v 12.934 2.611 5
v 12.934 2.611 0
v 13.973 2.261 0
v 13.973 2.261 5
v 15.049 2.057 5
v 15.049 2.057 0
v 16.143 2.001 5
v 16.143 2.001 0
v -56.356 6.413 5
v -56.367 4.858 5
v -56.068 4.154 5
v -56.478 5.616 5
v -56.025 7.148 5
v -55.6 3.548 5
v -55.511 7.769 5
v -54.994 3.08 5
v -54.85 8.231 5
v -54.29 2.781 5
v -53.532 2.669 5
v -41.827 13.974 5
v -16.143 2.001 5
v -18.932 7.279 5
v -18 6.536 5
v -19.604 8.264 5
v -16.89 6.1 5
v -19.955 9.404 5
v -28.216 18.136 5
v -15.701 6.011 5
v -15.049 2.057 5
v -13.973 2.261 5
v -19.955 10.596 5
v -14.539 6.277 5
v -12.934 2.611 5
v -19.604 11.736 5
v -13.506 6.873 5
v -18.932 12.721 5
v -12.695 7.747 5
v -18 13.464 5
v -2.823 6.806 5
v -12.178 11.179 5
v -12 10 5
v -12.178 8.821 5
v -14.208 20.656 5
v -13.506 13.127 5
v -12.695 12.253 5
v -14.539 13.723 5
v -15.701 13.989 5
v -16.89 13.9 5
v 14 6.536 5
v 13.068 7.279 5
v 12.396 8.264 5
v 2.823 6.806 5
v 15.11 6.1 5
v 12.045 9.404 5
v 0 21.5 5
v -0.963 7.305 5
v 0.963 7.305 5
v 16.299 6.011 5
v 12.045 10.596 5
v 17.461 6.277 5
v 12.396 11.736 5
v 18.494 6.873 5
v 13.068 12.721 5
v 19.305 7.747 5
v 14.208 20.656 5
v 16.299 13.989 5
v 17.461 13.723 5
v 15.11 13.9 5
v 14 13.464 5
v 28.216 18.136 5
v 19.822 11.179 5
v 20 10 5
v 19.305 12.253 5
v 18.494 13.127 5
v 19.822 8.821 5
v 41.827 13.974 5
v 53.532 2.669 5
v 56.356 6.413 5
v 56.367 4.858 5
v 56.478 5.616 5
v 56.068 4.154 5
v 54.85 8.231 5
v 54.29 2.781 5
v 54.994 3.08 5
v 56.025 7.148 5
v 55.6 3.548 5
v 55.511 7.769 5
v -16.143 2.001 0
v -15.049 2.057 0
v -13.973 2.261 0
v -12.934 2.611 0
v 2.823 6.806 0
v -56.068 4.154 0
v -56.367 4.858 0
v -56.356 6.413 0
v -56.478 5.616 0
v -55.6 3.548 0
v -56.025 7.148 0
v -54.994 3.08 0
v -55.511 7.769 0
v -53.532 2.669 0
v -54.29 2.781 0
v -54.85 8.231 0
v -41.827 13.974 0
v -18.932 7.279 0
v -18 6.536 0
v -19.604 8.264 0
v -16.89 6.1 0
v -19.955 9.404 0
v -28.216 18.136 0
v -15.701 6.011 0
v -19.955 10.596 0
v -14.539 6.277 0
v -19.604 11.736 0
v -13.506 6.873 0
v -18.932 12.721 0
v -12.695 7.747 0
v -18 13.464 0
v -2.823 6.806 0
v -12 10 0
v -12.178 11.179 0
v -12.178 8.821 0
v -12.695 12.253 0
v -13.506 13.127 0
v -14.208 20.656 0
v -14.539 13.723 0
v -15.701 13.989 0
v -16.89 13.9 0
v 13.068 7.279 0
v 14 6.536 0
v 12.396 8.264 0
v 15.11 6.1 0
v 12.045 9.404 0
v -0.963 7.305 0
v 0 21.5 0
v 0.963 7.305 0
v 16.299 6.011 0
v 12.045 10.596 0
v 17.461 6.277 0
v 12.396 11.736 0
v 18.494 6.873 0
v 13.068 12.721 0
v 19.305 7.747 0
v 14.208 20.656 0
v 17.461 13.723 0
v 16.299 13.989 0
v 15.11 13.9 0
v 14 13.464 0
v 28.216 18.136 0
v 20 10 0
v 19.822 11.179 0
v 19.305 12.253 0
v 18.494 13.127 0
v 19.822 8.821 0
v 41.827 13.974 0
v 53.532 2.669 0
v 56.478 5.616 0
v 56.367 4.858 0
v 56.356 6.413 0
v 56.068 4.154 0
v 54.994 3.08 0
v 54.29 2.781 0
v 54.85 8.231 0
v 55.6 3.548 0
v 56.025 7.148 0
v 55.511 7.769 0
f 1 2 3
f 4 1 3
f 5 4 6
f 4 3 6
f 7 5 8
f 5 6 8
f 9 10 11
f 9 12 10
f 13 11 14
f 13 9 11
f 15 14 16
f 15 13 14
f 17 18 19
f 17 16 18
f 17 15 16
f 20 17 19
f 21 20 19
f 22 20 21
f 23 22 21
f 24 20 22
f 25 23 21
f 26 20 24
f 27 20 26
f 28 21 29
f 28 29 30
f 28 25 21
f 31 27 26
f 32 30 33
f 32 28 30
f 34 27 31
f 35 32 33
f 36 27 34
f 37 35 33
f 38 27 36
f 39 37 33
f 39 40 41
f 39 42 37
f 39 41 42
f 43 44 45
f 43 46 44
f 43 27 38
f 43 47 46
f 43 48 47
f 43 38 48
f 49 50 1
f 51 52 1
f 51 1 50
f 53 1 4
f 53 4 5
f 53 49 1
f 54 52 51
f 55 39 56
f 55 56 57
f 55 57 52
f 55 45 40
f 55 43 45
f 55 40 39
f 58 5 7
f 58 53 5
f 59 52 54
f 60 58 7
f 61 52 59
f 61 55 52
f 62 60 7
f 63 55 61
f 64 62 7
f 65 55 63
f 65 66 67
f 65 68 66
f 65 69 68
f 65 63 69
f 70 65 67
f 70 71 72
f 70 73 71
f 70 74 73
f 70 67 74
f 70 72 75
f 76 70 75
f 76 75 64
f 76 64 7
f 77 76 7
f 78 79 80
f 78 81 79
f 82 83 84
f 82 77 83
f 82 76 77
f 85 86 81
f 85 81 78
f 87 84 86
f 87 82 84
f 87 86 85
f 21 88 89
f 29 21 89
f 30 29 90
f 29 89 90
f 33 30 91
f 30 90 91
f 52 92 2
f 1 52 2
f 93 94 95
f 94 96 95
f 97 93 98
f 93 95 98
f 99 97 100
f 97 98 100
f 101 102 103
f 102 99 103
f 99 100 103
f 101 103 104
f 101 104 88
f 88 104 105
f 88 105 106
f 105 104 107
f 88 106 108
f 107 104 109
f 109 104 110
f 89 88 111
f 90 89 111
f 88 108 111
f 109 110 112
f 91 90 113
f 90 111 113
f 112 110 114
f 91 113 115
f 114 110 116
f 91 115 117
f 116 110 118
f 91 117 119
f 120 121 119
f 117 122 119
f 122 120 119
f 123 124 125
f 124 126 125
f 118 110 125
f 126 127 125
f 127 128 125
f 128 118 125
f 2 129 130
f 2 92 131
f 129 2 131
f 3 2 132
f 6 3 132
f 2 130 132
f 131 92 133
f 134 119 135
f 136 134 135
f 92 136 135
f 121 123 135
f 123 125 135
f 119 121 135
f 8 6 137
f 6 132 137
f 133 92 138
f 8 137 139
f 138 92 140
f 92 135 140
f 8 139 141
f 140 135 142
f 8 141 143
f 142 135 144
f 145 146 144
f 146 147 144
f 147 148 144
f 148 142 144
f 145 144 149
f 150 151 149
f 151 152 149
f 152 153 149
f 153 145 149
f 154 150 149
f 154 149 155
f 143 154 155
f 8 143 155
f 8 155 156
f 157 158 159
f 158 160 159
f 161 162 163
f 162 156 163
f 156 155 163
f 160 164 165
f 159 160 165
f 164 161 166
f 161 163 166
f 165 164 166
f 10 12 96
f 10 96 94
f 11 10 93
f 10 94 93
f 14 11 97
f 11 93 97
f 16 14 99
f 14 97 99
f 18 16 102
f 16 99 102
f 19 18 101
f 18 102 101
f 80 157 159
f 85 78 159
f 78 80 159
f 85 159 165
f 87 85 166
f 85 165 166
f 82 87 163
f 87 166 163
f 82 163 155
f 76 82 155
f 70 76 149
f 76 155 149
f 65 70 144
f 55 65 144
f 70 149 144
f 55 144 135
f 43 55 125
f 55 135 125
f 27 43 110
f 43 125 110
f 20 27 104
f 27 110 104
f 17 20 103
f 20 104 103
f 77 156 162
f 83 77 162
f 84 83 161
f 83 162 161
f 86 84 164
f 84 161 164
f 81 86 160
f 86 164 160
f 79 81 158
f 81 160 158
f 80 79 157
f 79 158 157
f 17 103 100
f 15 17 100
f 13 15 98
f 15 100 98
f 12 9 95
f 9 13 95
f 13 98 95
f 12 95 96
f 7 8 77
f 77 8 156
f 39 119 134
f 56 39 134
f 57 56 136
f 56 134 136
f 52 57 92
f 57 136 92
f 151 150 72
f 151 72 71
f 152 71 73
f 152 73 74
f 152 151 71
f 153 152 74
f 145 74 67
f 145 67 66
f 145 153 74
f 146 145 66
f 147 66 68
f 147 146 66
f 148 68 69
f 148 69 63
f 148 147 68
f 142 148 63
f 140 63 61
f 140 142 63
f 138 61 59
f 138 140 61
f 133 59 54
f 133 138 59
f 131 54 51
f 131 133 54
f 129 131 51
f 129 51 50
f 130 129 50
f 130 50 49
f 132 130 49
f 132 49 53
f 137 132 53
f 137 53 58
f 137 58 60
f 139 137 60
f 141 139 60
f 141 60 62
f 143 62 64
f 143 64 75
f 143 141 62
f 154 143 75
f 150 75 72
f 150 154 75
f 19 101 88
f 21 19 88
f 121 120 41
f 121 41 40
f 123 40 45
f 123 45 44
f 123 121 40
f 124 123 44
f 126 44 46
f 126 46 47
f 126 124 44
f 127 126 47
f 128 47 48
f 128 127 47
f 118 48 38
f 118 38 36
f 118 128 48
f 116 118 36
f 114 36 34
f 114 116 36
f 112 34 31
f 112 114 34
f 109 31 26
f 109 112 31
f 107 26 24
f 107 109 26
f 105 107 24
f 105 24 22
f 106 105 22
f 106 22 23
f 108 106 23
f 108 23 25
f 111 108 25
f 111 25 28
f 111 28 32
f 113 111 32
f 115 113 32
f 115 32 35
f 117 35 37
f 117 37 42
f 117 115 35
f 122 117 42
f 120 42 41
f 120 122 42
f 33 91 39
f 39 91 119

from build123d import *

# Parameters (mm, degrees)
SKETCH1_R           = 4
BOSS_EXTRUDE2_DEPTH = 5
FILLET3_R           = 3


with BuildPart() as part:
    # Sketch1 → Boss-Extrude2 (new body)
    with BuildSketch(Plane.XY):
        with BuildLine():
            ThreePointArc((-2.823470485, 6.805503827), (0, 7.367962264), (2.823470485, 6.805503827))
            Line((2.823470485, 6.805503827), (12.934326877, 2.610707185))
            ThreePointArc((12.934326877, 2.610707185), (14.507189087, 2.140514293), (16.142912091, 2.001276593))
            Line((16.142912091, 2.001276593), (56.478756137, 2.721951573))
            Line((56.478756137, 2.721951573), (56.478756137, 7.377996322))
            ThreePointArc((56.478756137, 7.377996322), (0, 21.5), (-56.478756137, 7.377996322))
            Line((-56.478756137, 7.377996322), (-56.478756137, 2.721951573))
            Line((-56.478756137, 2.721951573), (-16.142912091, 2.001276593))
            ThreePointArc((-16.142912091, 2.001276593), (-14.507189087, 2.140514293), (-12.934326877, 2.610707185))
            Line((-12.934326877, 2.610707185), (-2.823470485, 6.805503827))
        make_face()
        with Locations((-16, 10)):
            Circle(SKETCH1_R, mode=Mode.SUBTRACT)
        with Locations((16, 10)):
            Circle(SKETCH1_R, mode=Mode.SUBTRACT)
    extrude(amount=BOSS_EXTRUDE2_DEPTH)

    # Fillet3
    # the kernel refuses this fillet: 3 mm, written as the material it takes off along each edge
    with BuildSketch(Plane(origin=(56.478756137, 2.721951573, -7.367195529), x_dir=(-0.9998404258161971, -0.017864011410817362, 0), z_dir=(0, 0, 1)), Plane(origin=(-56.478756137, 2.721951573, -7.367195529), x_dir=(0, 1, 0), z_dir=(0, 0, 1))) as fillet3_piece_1:
        with BuildLine():
            CenterArc((FILLET3_R * 0.982292737151, -FILLET3_R), FILLET3_R, 90, 88.976413094)
            Line((-FILLET3_R * 0.0175476886652, -FILLET3_R * 0.982135988589), (0, 0))
            Line((0, 0), (FILLET3_R * 0.982292737151, 0))
        make_face()
    extrude(amount=19.734391057, mode=Mode.SUBTRACT)
    with BuildSketch(Plane(origin=(56.478756137, 7.377996322, -4.596333569), x_dir=(0, -1, 0), z_dir=(0, 0, 1))) as fillet3_piece_2:
        with BuildLine():
            CenterArc((1.8154063, -3), FILLET3_R, 90, 62.800936738)
            ThreePointArc((-0.852865239, -1.628749843), (-0.429551947, -0.812741542), (0, 0))
            Line((0, 0), (1.8154063, 0))
        make_face()
    extrude(amount=14.192667139, mode=Mode.SUBTRACT)
    with BuildSketch(Plane(origin=(-56.478756137, 7.377996322, -4.596333569), x_dir=(0, -1, 0), z_dir=(0, 0, 1))) as fillet3_piece_3:
        with BuildLine():
            CenterArc((1.8154063, 3), FILLET3_R, 207.199063262, 62.800936738)
            ThreePointArc((-0.852865239, 1.628749843), (-0.429551947, 0.812741542), (0, 0))
            Line((0, 0), (1.8154063, 0))
        make_face()
    extrude(amount=14.192667139, mode=Mode.SUBTRACT)


solid = part.part
